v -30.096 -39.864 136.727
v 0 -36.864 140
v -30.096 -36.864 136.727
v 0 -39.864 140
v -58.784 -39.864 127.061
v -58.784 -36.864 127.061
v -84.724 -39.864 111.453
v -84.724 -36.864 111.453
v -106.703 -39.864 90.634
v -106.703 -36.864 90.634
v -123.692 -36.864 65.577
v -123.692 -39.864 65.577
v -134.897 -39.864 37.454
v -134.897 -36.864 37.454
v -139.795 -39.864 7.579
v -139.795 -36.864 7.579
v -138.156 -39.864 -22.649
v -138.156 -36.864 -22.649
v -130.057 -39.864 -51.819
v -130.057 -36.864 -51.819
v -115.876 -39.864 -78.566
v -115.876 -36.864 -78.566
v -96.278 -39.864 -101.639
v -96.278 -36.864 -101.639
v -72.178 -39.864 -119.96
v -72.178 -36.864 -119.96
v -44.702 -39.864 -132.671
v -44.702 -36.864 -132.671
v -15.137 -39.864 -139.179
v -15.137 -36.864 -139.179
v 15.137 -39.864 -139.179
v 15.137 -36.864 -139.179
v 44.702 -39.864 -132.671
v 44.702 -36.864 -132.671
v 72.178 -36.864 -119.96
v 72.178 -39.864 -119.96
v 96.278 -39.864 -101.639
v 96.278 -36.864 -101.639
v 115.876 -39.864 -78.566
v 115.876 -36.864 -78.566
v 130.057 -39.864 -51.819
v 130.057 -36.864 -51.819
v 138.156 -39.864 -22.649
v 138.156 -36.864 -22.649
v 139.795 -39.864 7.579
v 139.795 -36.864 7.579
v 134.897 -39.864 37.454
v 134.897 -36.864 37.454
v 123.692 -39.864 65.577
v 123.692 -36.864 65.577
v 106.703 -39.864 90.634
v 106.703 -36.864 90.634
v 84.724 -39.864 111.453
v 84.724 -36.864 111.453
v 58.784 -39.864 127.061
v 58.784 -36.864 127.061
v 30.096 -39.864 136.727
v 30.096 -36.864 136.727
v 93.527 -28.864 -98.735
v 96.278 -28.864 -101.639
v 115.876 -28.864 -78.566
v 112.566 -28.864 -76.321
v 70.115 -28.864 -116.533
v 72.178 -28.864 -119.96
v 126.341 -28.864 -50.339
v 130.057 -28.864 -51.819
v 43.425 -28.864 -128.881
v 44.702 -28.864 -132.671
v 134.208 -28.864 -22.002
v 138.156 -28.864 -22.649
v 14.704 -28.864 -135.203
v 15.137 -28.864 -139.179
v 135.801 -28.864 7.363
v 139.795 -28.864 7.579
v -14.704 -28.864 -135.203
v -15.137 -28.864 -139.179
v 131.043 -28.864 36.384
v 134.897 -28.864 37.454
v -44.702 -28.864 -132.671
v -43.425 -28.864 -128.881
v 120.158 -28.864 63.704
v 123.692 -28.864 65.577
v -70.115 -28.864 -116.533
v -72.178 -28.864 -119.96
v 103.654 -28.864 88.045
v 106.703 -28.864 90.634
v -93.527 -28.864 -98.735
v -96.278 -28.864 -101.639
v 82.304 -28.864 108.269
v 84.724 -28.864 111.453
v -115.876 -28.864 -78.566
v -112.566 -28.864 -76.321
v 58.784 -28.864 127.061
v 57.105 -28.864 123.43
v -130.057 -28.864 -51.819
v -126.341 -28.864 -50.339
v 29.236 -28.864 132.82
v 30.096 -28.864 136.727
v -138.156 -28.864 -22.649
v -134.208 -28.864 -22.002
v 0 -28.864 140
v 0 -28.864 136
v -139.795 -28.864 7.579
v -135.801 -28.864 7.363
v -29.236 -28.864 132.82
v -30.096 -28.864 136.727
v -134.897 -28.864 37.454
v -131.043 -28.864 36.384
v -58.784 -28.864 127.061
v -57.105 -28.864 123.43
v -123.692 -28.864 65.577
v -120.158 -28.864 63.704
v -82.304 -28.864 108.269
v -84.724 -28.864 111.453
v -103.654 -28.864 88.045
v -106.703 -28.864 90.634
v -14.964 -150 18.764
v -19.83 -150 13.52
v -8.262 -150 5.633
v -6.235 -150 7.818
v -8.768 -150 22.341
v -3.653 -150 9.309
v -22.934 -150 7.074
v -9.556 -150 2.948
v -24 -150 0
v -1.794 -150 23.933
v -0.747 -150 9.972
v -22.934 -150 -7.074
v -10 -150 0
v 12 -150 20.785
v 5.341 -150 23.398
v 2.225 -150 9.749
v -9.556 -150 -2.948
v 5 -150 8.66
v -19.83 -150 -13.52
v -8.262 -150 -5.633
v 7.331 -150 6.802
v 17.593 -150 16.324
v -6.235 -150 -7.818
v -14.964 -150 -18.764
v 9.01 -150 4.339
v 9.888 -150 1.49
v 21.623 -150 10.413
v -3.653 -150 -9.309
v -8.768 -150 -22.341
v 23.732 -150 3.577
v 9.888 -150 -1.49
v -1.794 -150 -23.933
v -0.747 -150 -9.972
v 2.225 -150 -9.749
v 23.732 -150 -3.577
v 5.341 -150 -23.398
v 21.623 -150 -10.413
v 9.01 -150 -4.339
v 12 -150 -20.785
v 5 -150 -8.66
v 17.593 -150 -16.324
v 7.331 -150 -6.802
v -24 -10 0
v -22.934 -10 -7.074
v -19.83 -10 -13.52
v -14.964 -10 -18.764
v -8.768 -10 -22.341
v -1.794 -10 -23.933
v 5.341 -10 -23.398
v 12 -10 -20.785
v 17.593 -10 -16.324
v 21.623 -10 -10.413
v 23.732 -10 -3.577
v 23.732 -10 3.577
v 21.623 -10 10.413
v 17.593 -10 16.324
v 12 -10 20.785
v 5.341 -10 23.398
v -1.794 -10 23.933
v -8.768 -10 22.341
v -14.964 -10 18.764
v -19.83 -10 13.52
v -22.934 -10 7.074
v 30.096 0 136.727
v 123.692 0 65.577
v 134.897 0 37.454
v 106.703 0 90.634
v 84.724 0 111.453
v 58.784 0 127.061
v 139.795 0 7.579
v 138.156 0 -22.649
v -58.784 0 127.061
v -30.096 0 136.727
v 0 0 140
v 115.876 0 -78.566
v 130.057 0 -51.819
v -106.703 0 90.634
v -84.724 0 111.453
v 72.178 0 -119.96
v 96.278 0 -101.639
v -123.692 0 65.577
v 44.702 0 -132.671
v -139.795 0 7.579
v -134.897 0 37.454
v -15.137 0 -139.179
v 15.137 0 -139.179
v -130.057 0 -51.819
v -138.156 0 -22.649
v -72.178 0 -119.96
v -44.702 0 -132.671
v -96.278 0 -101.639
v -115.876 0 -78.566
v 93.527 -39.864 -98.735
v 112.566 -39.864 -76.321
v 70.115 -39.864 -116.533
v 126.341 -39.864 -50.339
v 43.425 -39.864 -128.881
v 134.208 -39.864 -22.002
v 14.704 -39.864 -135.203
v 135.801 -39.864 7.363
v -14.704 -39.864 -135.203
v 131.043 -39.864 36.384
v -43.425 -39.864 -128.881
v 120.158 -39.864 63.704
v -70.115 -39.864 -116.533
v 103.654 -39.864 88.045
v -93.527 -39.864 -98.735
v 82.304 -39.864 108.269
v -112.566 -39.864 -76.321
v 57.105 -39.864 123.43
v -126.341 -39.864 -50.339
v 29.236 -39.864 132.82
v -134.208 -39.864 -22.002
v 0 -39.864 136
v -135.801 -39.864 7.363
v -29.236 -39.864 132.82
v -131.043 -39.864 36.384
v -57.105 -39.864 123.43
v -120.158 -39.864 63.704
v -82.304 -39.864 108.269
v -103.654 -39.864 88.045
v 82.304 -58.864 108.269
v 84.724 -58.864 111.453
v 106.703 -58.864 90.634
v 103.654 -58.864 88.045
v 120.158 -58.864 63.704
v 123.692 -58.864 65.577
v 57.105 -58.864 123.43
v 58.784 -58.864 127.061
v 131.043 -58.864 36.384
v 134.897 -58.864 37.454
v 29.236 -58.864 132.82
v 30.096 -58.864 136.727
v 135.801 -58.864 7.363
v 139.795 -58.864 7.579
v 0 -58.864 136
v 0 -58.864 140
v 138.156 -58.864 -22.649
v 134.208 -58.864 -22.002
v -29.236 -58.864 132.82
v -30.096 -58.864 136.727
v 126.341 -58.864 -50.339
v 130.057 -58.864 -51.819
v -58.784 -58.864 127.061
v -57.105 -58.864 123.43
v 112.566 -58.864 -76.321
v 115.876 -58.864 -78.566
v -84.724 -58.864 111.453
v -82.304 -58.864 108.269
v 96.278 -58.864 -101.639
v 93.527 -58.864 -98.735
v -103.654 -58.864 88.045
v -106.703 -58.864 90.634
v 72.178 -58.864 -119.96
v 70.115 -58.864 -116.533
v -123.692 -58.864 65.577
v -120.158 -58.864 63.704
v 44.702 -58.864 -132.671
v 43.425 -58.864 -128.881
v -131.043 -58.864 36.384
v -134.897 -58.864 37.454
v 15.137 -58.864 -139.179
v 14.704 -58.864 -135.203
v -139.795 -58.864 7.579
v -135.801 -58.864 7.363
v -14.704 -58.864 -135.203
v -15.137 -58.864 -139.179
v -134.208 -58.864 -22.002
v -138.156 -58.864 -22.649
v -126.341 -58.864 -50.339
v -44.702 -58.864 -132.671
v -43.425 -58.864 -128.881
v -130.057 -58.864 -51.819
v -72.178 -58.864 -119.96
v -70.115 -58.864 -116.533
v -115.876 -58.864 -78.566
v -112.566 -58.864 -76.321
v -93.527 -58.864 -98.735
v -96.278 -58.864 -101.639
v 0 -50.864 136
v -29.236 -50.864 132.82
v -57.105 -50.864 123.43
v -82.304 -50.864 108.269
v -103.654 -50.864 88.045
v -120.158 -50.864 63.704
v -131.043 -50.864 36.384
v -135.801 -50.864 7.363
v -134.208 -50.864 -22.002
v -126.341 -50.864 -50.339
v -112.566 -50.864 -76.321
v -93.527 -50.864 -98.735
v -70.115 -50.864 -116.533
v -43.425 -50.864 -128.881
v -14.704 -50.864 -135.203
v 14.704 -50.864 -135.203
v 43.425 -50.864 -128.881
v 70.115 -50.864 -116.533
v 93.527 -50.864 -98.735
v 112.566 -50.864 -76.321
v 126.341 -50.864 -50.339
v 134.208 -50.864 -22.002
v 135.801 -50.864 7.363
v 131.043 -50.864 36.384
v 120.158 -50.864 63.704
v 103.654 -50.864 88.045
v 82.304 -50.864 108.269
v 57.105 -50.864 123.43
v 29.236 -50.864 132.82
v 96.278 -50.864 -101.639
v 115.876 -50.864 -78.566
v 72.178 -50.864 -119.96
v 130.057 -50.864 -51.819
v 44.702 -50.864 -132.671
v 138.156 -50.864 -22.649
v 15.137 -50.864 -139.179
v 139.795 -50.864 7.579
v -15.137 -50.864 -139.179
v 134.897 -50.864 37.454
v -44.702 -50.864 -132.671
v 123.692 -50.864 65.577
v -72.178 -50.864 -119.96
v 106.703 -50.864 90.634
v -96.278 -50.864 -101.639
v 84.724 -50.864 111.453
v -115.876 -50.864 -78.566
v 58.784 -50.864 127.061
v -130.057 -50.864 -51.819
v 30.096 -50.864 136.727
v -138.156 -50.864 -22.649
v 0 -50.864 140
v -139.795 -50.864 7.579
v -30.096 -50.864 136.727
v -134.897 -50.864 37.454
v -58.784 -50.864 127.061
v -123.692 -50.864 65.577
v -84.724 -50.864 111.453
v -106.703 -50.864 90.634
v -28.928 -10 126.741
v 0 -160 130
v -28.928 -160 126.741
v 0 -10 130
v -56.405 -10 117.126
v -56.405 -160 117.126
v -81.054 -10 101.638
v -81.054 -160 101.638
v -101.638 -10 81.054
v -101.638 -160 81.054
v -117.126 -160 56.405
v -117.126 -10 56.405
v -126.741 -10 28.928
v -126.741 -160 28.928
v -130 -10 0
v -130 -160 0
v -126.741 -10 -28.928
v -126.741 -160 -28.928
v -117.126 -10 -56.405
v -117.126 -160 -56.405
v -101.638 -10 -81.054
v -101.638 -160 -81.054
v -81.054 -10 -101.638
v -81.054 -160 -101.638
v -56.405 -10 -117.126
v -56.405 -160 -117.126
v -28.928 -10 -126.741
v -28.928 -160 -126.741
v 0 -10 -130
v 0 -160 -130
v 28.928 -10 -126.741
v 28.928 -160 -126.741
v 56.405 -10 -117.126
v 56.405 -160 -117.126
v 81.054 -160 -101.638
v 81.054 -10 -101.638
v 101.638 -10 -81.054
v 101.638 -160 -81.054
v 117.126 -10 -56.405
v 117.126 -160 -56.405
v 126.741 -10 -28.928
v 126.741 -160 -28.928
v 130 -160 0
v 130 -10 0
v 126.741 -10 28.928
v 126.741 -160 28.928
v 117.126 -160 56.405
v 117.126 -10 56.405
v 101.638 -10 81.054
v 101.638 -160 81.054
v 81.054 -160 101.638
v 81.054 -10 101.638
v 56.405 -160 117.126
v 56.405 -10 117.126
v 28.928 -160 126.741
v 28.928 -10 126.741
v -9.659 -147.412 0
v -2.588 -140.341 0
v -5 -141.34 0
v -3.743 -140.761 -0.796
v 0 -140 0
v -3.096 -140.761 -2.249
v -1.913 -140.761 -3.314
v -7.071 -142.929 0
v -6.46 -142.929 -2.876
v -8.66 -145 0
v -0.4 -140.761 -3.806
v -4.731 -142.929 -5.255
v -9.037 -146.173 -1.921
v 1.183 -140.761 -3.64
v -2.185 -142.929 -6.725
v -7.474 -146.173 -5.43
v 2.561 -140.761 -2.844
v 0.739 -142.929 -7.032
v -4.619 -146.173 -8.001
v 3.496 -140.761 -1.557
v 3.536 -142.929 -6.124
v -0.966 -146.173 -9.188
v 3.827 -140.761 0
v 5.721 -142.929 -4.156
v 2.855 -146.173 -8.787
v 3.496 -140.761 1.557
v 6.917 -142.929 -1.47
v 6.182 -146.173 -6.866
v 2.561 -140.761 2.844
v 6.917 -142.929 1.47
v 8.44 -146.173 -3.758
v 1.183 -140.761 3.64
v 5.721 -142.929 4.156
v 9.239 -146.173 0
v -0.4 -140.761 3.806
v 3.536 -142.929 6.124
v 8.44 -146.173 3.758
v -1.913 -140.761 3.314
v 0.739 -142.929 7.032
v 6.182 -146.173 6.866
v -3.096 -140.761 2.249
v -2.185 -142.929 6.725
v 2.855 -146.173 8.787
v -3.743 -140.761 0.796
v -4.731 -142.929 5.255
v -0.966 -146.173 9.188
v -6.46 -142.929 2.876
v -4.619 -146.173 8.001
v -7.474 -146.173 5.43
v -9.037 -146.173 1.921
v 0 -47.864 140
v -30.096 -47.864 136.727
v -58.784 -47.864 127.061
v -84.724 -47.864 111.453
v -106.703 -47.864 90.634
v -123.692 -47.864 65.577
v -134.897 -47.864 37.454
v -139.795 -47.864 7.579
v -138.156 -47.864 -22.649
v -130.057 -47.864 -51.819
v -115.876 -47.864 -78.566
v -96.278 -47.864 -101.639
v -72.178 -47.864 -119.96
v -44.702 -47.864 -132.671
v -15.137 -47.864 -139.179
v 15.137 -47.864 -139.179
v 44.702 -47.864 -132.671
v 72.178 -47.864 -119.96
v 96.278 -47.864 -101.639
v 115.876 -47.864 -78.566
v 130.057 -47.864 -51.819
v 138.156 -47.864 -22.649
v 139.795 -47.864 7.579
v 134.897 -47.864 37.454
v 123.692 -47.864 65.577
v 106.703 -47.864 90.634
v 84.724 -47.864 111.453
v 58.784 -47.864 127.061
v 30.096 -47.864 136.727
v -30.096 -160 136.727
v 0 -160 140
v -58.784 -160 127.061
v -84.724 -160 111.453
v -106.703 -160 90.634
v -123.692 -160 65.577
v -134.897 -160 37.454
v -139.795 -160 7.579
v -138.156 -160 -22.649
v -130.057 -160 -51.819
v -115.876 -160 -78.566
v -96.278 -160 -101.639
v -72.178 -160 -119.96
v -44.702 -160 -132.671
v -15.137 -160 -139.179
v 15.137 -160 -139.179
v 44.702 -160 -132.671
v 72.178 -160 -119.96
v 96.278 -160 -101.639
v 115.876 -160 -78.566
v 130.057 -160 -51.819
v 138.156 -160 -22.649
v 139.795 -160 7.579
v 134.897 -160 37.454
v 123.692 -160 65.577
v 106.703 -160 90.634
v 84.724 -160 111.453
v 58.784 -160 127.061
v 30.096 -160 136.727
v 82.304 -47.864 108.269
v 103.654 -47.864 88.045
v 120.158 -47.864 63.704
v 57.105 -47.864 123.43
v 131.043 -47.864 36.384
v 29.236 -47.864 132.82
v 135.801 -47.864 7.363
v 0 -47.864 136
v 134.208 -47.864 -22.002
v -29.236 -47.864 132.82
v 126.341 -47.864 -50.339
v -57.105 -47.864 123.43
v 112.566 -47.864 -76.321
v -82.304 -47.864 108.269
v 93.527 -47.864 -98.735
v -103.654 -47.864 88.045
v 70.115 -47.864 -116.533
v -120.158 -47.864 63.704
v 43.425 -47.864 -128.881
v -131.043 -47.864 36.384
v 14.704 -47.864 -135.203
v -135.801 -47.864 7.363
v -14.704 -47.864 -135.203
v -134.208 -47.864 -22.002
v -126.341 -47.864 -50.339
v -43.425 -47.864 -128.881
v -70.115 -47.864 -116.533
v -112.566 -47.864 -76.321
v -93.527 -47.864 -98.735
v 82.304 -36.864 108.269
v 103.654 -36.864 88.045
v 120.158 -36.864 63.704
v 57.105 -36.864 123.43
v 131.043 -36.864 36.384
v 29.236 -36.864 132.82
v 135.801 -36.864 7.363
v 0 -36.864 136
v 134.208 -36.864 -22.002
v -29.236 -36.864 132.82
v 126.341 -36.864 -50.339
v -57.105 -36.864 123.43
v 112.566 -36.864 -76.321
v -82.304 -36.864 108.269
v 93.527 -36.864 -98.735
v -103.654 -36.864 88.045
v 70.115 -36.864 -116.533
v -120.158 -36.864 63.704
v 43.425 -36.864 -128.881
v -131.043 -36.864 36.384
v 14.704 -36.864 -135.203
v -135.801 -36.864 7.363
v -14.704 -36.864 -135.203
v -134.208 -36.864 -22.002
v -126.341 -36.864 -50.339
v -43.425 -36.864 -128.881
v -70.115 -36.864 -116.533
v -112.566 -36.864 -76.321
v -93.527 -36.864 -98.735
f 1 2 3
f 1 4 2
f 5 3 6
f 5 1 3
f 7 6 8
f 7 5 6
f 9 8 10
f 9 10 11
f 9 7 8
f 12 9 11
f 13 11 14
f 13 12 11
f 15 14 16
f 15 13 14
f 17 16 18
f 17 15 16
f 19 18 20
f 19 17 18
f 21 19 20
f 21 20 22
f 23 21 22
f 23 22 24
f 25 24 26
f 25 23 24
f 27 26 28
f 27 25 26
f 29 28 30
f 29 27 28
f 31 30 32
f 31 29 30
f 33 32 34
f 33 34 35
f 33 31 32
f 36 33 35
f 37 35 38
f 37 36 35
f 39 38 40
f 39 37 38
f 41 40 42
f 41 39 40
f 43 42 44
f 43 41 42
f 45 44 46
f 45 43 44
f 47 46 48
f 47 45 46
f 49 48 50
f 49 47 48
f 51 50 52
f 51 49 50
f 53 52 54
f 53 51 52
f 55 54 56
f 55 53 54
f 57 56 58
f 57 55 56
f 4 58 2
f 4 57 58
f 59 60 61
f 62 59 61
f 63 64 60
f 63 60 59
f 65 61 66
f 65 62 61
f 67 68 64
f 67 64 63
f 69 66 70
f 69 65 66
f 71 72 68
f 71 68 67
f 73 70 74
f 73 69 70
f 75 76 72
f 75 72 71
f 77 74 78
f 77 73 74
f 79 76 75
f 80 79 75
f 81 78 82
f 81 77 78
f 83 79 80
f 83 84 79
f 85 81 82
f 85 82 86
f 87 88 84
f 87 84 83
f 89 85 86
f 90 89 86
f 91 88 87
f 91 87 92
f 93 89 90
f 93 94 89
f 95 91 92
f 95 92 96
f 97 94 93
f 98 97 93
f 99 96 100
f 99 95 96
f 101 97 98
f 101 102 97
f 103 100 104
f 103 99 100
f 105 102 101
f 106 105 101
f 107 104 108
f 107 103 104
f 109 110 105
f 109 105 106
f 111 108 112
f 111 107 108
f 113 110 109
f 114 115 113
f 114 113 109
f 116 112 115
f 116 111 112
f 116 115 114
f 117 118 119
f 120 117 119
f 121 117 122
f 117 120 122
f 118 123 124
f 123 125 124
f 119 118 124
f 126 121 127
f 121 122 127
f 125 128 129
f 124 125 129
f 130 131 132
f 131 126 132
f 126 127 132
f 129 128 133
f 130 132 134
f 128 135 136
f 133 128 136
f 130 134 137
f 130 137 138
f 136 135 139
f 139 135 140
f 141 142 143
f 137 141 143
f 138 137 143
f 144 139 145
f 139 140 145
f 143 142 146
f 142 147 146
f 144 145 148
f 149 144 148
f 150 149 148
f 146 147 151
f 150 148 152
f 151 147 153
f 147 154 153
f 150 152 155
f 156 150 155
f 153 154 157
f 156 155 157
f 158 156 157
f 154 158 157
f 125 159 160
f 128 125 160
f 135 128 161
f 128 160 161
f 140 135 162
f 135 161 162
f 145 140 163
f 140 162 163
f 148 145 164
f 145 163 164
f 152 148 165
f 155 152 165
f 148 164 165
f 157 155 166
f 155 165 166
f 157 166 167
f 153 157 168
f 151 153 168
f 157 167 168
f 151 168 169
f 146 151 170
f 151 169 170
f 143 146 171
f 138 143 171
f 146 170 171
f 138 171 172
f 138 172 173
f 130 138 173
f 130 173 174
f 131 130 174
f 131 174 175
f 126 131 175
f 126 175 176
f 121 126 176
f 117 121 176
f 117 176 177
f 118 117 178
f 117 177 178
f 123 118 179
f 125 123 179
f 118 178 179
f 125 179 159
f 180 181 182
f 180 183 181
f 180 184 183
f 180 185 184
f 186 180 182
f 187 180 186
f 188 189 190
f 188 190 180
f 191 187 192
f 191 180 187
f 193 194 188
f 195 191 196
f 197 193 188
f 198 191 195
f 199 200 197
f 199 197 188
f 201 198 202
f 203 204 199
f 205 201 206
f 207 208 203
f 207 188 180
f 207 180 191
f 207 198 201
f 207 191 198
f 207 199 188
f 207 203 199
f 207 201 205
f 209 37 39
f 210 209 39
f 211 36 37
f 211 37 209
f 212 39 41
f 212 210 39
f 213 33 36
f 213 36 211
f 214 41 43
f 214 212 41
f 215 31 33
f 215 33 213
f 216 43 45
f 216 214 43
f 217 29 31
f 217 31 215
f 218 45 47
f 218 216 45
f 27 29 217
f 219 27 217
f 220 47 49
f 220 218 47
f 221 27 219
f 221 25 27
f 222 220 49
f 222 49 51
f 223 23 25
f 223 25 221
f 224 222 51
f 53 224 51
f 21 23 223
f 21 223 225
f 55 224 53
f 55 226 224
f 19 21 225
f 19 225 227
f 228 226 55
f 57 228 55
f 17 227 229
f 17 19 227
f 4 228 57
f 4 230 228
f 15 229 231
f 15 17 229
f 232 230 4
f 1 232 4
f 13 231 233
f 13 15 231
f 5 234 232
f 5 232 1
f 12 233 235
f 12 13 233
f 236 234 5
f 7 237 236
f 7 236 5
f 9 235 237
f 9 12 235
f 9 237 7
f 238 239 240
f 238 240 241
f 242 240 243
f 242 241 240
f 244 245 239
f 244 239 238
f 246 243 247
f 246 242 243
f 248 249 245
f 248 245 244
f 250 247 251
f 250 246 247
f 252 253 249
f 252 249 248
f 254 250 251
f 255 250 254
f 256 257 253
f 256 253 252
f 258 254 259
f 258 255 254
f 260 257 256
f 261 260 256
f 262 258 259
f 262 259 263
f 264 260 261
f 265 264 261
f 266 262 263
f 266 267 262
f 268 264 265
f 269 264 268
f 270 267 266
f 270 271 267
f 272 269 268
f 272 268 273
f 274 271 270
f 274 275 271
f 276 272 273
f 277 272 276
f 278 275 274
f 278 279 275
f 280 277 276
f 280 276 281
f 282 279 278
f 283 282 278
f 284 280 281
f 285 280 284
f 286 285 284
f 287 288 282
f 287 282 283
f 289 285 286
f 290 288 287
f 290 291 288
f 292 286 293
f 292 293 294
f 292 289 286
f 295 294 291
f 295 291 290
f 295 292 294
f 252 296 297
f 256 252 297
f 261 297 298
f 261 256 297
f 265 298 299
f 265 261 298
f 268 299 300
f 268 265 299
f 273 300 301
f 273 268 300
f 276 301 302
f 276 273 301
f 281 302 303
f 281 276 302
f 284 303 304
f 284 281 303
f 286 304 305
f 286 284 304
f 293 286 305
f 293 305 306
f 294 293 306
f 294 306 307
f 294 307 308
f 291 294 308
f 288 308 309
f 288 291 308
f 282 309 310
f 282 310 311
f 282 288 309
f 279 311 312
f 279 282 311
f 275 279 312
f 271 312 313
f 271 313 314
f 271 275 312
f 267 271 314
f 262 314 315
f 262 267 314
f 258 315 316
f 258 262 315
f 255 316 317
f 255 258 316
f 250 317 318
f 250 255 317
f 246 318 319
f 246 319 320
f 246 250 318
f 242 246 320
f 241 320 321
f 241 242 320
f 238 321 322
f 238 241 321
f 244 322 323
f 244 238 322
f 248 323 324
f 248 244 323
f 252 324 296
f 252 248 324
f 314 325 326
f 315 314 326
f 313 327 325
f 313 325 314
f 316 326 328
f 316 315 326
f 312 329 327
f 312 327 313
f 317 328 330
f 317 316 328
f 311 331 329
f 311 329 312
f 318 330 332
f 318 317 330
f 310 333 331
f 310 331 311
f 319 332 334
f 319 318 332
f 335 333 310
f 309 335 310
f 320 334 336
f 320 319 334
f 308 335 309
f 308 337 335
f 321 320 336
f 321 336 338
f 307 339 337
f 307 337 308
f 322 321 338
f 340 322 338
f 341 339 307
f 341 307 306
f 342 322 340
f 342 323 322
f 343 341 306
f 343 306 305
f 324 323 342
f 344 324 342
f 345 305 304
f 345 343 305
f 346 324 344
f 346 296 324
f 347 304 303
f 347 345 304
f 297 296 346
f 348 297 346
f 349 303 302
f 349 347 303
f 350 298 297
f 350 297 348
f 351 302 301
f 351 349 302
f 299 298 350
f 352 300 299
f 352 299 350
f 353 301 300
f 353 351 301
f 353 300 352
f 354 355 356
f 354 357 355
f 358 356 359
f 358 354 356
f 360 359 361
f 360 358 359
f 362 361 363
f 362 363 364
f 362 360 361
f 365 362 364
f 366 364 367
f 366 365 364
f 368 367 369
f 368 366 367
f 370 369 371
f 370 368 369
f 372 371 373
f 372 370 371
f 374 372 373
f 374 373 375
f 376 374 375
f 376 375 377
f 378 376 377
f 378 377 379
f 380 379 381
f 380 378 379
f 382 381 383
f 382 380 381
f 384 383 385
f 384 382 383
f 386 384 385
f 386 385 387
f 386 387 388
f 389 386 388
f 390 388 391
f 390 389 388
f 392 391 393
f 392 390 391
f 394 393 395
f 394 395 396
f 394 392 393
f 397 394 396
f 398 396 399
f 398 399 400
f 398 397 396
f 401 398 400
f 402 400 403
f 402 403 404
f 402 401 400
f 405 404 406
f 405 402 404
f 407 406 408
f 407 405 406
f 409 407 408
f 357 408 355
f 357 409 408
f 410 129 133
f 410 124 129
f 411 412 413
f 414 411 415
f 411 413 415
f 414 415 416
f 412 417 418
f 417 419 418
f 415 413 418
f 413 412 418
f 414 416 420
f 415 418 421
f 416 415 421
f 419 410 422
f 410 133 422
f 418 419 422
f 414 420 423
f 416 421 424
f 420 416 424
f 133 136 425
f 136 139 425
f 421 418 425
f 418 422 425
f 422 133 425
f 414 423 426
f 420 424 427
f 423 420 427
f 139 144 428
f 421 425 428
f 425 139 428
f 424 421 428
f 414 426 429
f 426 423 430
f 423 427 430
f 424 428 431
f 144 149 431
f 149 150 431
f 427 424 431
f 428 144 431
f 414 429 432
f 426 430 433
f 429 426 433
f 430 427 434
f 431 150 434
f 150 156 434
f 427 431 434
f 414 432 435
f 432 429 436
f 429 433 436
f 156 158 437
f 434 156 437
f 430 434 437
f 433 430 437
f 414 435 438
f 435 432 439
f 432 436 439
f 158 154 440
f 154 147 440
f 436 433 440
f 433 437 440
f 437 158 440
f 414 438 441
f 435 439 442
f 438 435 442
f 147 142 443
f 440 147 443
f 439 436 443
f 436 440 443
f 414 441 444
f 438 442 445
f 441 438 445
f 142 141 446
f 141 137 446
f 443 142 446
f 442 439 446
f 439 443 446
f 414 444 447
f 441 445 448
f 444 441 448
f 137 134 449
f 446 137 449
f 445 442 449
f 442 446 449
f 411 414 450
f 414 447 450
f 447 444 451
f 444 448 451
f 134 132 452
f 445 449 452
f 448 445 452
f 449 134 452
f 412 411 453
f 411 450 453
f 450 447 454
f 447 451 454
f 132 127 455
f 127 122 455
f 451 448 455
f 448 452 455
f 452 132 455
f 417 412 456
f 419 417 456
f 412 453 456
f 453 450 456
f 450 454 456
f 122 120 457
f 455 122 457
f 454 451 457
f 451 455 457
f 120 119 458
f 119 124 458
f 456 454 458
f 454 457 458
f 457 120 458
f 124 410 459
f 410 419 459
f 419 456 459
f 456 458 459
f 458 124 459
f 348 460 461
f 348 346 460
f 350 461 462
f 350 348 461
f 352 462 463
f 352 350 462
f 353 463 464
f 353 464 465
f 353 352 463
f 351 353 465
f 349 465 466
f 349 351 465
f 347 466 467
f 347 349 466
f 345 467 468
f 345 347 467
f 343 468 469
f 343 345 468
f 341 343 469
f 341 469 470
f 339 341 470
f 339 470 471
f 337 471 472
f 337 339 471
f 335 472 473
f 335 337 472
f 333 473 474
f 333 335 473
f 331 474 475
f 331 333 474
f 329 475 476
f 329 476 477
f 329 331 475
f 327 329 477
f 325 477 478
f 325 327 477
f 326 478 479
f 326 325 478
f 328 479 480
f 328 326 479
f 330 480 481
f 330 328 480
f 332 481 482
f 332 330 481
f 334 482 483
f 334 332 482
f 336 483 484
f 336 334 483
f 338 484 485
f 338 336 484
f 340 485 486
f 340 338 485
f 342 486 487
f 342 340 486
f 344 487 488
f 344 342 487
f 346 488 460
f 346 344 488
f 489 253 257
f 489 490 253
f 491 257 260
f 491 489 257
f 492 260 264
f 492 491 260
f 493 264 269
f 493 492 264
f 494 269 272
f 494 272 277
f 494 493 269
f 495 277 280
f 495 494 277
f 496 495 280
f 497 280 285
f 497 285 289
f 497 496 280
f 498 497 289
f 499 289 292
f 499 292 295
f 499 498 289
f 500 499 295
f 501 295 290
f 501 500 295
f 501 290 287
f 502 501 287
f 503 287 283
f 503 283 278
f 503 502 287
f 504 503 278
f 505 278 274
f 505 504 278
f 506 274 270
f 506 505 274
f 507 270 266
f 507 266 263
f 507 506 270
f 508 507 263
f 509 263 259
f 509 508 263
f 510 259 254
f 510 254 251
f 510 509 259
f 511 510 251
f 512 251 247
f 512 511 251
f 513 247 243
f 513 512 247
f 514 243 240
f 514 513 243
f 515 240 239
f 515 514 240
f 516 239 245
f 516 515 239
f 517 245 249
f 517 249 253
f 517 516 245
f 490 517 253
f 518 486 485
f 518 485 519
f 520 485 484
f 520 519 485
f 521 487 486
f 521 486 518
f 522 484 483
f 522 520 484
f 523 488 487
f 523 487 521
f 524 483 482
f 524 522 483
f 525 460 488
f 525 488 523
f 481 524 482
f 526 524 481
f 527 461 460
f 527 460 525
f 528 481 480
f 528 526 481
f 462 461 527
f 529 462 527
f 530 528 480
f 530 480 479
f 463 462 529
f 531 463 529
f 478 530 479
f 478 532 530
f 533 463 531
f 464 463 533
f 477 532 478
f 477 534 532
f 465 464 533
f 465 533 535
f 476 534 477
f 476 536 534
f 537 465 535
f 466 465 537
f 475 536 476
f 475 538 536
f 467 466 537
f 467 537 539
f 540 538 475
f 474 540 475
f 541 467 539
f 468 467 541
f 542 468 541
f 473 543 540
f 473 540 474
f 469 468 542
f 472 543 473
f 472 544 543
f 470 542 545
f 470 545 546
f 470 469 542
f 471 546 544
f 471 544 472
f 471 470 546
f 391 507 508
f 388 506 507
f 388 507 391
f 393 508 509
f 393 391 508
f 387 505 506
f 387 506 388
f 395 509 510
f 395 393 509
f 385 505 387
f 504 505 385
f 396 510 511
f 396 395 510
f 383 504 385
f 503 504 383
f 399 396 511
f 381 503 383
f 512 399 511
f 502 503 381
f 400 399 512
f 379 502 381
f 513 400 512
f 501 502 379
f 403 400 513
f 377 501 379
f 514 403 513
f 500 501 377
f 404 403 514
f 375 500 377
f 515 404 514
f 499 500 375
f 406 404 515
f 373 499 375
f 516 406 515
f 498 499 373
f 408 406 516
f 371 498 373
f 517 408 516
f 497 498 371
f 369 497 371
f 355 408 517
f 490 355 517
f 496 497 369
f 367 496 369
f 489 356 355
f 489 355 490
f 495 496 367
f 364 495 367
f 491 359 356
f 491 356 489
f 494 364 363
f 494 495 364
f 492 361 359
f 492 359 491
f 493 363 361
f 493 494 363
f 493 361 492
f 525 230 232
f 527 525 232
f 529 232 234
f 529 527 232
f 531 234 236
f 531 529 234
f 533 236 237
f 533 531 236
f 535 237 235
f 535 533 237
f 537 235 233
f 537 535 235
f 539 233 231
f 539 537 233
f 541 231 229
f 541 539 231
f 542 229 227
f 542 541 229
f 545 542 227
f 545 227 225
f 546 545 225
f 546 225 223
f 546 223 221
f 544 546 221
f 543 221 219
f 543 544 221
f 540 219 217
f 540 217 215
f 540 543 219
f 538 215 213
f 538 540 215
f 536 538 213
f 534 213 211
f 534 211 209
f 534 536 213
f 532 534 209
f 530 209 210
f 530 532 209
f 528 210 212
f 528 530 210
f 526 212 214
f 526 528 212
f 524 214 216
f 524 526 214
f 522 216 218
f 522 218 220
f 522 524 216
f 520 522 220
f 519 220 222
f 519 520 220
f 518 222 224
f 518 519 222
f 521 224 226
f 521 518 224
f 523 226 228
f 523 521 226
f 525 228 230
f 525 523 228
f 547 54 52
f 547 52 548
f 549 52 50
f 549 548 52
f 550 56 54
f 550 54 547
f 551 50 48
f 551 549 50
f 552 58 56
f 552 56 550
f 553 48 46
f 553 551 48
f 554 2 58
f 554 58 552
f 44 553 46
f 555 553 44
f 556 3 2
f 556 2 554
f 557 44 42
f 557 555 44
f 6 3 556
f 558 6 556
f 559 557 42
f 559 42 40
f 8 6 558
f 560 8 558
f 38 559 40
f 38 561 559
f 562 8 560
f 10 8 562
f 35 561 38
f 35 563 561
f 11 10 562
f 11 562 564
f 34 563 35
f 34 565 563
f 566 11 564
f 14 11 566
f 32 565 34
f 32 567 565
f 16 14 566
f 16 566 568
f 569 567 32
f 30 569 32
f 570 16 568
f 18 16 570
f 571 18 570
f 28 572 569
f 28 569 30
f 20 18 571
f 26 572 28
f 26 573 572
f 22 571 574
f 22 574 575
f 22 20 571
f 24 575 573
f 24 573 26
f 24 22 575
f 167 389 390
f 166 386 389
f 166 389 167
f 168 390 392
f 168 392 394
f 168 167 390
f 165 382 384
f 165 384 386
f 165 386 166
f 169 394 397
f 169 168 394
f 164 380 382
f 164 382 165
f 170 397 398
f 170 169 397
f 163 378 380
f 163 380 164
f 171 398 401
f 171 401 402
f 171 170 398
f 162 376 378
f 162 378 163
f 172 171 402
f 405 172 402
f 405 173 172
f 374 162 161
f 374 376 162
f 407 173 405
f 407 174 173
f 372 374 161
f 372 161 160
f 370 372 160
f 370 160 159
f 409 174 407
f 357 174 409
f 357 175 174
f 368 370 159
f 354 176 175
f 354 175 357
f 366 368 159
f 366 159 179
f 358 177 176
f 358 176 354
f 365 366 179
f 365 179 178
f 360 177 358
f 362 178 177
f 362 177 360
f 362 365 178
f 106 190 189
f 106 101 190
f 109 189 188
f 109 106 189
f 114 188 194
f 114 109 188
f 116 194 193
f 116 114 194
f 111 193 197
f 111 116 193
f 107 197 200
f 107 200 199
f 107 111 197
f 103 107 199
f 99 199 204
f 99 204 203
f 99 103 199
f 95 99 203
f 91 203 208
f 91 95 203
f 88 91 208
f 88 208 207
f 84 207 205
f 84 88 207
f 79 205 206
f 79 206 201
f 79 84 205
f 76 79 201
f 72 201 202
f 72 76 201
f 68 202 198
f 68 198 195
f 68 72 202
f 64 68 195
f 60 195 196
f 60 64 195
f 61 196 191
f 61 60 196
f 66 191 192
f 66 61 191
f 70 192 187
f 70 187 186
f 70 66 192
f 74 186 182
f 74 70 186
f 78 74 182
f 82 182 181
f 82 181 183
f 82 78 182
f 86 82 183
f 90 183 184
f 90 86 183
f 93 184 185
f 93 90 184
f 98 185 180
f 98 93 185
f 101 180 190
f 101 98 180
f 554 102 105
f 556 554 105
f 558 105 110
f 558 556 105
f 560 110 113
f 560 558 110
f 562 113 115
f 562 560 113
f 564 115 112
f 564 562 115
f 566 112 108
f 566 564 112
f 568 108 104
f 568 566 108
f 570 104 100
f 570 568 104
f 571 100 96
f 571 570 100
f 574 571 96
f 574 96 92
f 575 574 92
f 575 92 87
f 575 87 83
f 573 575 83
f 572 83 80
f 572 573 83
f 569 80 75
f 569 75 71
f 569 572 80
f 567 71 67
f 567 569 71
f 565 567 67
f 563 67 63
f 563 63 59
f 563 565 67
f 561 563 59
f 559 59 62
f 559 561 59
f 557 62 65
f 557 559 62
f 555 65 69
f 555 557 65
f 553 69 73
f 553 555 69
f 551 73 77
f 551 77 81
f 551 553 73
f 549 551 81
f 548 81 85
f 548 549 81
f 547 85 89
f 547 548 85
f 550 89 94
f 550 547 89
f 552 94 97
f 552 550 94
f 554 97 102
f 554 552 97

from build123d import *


with BuildPart() as part:
    # Sketch1 → Revolve1 (revolve)
    with BuildSketch(Plane.XY, mode=Mode.PRIVATE) as revolve1_sk:
        Polygon((0, 0), (140, 0), (140, -28.863803247), (136, -28.863803247), (136, -36.863803247), (140, -36.863803247), (140, -39.863803247), (136, -39.863803247), (136, -47.863803247), (140, -47.863803247), (140, -50.863803247), (136, -50.863803247), (136, -58.863803247), (140, -58.863803247), (140, -160), (130, -160), (130, -10), (0, -10), align=None)
    revolve(revolve1_sk.sketch.rotate(Axis((0, 0, 0), (0, -1, 0)), 90), axis=Axis((0, 0, 0), (0, -1, 0)))

    # Sketch2 → Revolve2 (revolve)
    with BuildSketch(Plane.XY, mode=Mode.PRIVATE) as revolve2_sk:
        with BuildLine():
            Line((0, 0), (0, -140))
            ThreePointArc((0, -140), (7.071067812, -142.928932188), (10, -150))
            Line((10, -150), (24, -150))
            Line((24, -150), (24, 0))
            Line((24, 0), (0, 0))
        make_face()
    revolve(revolve2_sk.sketch.rotate(Axis((0, 0, 0), (0, -1, 0)), 180), axis=Axis((0, 0, 0), (0, -1, 0)))


solid = part.part
